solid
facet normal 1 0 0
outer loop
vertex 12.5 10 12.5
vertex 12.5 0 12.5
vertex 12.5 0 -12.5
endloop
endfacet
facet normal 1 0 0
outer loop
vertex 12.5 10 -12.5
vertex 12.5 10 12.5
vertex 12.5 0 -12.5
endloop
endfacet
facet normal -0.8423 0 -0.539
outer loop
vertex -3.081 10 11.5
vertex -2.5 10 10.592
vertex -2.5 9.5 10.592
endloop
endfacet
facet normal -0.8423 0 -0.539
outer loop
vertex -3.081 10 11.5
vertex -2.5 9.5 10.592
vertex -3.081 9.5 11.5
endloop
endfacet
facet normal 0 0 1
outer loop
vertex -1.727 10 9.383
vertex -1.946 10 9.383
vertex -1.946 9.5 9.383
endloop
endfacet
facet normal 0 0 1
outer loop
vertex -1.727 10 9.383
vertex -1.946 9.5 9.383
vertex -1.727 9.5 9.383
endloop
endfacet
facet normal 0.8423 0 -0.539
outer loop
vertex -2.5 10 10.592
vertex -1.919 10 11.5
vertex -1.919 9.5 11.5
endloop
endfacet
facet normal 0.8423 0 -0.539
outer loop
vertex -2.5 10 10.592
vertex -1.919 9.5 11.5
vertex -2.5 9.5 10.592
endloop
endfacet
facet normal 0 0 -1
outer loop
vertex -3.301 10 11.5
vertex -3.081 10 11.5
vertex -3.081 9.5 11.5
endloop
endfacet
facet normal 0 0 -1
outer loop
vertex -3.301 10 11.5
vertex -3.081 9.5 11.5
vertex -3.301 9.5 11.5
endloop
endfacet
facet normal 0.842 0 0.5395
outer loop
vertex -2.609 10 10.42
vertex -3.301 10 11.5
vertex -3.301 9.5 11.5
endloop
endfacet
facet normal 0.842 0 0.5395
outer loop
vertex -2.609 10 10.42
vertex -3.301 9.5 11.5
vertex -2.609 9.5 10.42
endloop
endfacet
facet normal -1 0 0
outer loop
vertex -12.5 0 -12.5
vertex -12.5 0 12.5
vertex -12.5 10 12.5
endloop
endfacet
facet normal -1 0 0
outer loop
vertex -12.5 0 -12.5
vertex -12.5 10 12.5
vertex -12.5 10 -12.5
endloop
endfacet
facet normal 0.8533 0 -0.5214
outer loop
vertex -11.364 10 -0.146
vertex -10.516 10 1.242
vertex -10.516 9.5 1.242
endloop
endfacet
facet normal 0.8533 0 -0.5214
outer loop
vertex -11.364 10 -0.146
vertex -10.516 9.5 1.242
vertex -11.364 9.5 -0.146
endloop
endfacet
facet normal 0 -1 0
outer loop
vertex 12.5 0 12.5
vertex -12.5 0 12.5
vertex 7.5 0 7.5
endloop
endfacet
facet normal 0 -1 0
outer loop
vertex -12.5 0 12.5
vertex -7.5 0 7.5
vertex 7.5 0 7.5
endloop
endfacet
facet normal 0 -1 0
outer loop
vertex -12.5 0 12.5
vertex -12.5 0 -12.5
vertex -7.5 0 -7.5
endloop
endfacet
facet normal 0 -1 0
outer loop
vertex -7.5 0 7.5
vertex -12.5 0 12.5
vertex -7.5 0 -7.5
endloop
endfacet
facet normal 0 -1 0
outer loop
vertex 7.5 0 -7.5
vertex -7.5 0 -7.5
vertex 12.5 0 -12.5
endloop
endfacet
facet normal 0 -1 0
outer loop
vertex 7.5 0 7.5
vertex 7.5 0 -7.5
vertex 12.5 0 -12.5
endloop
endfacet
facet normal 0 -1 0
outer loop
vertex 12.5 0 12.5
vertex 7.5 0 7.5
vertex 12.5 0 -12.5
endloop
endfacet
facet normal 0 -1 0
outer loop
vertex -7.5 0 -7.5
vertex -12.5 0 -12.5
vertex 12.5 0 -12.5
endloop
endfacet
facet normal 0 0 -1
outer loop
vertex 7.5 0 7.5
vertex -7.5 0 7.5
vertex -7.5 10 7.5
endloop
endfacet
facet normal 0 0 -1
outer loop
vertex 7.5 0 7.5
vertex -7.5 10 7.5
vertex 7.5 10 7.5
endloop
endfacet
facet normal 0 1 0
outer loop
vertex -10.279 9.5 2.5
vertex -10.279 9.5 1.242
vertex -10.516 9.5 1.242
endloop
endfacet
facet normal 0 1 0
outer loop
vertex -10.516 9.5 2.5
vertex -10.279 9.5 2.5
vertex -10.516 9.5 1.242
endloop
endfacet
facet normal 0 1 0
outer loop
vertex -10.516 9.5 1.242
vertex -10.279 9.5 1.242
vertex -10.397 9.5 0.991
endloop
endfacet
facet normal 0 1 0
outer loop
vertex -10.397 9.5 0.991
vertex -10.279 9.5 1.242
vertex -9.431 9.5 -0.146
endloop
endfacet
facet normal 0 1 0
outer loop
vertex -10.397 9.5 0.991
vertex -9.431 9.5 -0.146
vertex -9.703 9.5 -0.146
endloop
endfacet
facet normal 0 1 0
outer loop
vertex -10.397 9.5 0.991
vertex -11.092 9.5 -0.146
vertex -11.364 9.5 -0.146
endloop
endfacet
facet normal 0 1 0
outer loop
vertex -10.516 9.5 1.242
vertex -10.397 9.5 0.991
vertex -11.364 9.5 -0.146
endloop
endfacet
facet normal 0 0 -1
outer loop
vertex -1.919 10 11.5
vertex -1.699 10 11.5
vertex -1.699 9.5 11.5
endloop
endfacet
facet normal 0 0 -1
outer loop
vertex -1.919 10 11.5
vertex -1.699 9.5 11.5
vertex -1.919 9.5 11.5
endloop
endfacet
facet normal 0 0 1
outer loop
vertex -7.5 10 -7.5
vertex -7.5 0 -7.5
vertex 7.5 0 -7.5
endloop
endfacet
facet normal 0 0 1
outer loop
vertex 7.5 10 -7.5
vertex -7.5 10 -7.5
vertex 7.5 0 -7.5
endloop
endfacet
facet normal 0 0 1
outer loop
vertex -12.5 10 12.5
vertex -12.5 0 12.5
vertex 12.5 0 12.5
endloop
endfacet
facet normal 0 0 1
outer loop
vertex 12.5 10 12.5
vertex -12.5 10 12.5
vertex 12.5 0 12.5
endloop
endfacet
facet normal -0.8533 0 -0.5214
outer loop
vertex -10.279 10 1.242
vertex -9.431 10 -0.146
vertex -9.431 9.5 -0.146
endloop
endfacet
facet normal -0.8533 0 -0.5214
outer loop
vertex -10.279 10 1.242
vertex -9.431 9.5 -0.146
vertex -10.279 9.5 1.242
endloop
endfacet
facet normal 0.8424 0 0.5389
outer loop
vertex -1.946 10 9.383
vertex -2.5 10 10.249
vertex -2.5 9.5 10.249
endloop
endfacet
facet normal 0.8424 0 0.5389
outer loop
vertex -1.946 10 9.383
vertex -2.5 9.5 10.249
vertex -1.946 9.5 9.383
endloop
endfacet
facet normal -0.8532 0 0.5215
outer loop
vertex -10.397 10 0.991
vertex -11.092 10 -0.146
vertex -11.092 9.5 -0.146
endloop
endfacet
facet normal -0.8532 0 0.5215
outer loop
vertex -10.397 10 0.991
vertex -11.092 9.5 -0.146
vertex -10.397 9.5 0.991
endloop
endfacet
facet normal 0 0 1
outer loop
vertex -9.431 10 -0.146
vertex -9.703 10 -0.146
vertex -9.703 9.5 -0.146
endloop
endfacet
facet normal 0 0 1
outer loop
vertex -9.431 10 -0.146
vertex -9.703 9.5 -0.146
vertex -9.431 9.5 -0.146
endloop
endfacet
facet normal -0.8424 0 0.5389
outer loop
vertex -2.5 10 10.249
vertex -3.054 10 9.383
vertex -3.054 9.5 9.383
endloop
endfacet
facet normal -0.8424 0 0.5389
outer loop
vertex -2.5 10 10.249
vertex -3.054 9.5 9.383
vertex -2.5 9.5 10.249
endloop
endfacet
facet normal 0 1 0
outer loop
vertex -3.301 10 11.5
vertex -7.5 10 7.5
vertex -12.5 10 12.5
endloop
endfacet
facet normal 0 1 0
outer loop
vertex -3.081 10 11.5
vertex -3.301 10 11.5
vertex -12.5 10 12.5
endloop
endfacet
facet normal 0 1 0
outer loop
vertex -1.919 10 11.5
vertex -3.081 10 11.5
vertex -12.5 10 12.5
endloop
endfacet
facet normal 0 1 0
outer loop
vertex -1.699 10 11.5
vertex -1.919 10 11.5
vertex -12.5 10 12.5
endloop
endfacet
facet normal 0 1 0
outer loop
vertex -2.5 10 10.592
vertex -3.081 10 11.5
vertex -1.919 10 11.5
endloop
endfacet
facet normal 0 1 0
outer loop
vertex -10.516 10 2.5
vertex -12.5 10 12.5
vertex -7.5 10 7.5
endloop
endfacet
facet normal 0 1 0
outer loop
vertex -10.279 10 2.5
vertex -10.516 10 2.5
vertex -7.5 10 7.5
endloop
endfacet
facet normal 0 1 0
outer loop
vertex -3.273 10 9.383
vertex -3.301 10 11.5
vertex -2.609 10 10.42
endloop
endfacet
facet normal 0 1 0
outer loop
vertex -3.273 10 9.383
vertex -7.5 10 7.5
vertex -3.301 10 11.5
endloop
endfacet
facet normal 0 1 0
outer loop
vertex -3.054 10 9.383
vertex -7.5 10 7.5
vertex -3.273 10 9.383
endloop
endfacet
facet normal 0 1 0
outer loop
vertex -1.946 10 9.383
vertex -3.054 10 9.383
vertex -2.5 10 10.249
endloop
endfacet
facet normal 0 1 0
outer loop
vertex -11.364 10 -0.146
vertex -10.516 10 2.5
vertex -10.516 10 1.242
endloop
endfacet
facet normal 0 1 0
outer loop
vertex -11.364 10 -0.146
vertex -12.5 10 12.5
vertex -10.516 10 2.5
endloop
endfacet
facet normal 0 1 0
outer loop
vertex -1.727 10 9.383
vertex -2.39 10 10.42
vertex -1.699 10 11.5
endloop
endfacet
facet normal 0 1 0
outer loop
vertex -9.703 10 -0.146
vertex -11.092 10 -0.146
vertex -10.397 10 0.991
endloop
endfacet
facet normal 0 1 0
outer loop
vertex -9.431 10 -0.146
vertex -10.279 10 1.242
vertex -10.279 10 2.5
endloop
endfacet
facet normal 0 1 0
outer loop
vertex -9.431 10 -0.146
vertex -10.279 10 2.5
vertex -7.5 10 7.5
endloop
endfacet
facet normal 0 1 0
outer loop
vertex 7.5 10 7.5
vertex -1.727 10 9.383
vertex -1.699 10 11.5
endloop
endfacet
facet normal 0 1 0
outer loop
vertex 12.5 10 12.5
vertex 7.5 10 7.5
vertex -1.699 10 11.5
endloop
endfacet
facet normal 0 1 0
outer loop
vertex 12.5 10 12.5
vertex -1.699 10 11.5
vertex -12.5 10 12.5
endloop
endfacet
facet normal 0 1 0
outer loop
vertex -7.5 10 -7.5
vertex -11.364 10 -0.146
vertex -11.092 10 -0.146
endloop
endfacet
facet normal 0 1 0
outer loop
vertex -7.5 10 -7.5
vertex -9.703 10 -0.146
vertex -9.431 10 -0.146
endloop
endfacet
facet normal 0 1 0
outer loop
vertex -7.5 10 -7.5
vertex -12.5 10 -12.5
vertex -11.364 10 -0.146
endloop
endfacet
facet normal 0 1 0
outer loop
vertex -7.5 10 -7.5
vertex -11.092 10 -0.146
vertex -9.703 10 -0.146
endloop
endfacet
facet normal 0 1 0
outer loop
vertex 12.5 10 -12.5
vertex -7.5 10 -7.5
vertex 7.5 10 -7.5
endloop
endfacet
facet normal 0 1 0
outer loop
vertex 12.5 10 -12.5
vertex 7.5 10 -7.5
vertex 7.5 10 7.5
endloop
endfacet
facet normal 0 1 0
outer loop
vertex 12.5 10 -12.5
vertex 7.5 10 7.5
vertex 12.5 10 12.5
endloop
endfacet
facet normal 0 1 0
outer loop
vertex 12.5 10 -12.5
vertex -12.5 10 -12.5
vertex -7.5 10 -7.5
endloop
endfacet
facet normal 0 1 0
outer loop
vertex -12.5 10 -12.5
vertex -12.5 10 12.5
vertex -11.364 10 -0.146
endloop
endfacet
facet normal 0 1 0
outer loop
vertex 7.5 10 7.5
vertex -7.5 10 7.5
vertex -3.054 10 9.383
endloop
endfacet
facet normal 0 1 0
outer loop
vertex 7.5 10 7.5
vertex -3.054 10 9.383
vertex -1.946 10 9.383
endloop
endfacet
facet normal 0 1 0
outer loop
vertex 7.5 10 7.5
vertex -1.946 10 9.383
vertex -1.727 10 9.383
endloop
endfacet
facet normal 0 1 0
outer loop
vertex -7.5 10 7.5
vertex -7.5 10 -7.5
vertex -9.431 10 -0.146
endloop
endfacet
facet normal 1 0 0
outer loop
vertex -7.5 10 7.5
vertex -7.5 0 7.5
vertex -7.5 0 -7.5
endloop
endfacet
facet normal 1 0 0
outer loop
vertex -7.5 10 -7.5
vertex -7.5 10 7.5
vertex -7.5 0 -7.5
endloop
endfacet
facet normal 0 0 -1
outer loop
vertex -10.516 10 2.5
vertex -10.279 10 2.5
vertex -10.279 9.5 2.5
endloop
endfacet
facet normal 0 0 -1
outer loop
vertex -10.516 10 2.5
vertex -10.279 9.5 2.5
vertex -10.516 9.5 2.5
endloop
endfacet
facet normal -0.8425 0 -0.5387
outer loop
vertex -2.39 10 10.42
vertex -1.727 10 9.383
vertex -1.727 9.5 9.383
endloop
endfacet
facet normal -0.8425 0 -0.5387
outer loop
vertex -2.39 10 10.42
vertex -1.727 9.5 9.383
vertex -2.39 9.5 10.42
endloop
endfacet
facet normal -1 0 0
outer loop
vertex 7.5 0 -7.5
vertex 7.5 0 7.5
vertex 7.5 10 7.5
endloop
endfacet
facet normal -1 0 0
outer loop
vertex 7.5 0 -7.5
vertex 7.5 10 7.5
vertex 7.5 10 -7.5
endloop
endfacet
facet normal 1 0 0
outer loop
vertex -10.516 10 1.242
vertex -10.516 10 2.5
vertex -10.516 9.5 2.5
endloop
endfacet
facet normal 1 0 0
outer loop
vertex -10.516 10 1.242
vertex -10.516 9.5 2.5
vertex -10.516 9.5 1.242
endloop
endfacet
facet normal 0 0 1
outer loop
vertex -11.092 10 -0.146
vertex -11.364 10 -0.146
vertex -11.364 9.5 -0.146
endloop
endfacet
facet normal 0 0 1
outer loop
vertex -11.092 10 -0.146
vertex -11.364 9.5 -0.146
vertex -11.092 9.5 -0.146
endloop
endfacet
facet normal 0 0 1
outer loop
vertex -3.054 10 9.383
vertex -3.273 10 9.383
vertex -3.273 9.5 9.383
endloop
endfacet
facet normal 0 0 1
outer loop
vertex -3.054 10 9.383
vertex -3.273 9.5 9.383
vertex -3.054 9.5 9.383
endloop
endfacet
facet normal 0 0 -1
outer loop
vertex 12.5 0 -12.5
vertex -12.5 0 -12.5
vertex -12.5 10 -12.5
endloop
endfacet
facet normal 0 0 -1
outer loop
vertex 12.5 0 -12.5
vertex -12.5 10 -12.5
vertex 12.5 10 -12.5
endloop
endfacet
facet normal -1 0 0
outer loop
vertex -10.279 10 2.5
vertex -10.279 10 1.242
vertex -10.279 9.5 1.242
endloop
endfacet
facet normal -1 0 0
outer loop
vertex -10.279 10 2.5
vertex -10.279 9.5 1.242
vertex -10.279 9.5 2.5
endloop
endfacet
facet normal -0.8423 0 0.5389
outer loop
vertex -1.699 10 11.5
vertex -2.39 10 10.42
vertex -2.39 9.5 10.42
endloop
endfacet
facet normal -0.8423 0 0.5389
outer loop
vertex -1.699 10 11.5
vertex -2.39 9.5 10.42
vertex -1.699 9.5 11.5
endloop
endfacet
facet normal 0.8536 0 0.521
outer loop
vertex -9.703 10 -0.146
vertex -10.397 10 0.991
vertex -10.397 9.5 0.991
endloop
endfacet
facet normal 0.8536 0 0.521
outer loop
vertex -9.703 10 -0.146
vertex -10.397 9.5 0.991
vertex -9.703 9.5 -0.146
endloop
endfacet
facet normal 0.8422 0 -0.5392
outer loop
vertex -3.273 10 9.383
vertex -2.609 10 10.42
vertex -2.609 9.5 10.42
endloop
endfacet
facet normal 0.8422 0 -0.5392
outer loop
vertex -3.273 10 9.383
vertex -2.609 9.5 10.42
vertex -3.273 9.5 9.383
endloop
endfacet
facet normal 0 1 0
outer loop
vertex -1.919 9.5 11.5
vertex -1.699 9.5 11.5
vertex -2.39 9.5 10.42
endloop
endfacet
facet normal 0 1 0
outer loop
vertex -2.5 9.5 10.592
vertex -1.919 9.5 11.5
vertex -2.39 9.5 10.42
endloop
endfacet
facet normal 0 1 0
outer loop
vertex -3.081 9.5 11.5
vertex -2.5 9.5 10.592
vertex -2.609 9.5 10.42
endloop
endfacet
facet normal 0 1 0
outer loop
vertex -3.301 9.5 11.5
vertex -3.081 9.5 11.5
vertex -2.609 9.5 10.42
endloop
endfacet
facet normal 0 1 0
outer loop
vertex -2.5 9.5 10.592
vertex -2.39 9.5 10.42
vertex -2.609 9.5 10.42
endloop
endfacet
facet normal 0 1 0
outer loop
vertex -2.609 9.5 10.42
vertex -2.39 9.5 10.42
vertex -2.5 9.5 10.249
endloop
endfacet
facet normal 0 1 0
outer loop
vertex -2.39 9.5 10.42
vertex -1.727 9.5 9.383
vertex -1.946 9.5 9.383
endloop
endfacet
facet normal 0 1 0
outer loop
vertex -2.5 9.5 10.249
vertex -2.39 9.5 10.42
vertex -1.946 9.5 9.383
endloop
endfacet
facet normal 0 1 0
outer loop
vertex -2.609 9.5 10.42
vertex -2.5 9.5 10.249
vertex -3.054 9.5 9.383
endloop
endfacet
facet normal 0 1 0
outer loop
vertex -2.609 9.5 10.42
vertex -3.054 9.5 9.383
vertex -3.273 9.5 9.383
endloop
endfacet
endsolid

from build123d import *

# Parameters (mm, degrees)
SKETCH1_W           = 25
SKETCH1_H           = 25
SKETCH1_W_2         = 15
SKETCH1_H_2         = 15
BOSS_EXTRUDE1_DEPTH = 10
CUT_EXTRUDE1_DEPTH  = 0.5


with BuildPart() as part:
    # Sketch1 → Boss-Extrude1 (new body)
    with BuildSketch(Plane(origin=(0, 0, 0), x_dir=(1, 0, 0), z_dir=(0, 1, 0))):
        Rectangle(SKETCH1_W, SKETCH1_H)
        Rectangle(SKETCH1_W_2, SKETCH1_H_2, mode=Mode.SUBTRACT)
    extrude(amount=BOSS_EXTRUDE1_DEPTH)

    # Sketch2 → Cut-Extrude1 (cut)
    with BuildSketch(Plane(origin=(0, 10, 0), x_dir=(1, 0, 0), z_dir=(0, 1, 0))):
        Polygon((-3.273397436, -9.383333333), (-3.05418336, -9.383333333), (-2.5, -10.249165331), (-1.94581664, -9.383333333), (-1.726602564, -9.383333333), (-2.390180956, -10.420466079), (-1.699465812, -11.5), (-1.918679888, -11.5), (-2.5, -10.591766827), (-3.081320112, -11.5), (-3.300534188, -11.5), (-2.609395032, -10.420466079), align=None)
        Polygon((-11.364316239, 0.145833333), (-11.092418703, 0.145833333), (-10.39703943, -0.991048177), (-9.702720186, 0.145833333), (-9.43082265, 0.145833333), (-10.278846154, -1.24227514), (-10.278846154, -2.5), (-10.516292735, -2.5), (-10.516292735, -1.24227514), align=None)
    extrude(amount=-CUT_EXTRUDE1_DEPTH, mode=Mode.SUBTRACT)


solid = part.part
